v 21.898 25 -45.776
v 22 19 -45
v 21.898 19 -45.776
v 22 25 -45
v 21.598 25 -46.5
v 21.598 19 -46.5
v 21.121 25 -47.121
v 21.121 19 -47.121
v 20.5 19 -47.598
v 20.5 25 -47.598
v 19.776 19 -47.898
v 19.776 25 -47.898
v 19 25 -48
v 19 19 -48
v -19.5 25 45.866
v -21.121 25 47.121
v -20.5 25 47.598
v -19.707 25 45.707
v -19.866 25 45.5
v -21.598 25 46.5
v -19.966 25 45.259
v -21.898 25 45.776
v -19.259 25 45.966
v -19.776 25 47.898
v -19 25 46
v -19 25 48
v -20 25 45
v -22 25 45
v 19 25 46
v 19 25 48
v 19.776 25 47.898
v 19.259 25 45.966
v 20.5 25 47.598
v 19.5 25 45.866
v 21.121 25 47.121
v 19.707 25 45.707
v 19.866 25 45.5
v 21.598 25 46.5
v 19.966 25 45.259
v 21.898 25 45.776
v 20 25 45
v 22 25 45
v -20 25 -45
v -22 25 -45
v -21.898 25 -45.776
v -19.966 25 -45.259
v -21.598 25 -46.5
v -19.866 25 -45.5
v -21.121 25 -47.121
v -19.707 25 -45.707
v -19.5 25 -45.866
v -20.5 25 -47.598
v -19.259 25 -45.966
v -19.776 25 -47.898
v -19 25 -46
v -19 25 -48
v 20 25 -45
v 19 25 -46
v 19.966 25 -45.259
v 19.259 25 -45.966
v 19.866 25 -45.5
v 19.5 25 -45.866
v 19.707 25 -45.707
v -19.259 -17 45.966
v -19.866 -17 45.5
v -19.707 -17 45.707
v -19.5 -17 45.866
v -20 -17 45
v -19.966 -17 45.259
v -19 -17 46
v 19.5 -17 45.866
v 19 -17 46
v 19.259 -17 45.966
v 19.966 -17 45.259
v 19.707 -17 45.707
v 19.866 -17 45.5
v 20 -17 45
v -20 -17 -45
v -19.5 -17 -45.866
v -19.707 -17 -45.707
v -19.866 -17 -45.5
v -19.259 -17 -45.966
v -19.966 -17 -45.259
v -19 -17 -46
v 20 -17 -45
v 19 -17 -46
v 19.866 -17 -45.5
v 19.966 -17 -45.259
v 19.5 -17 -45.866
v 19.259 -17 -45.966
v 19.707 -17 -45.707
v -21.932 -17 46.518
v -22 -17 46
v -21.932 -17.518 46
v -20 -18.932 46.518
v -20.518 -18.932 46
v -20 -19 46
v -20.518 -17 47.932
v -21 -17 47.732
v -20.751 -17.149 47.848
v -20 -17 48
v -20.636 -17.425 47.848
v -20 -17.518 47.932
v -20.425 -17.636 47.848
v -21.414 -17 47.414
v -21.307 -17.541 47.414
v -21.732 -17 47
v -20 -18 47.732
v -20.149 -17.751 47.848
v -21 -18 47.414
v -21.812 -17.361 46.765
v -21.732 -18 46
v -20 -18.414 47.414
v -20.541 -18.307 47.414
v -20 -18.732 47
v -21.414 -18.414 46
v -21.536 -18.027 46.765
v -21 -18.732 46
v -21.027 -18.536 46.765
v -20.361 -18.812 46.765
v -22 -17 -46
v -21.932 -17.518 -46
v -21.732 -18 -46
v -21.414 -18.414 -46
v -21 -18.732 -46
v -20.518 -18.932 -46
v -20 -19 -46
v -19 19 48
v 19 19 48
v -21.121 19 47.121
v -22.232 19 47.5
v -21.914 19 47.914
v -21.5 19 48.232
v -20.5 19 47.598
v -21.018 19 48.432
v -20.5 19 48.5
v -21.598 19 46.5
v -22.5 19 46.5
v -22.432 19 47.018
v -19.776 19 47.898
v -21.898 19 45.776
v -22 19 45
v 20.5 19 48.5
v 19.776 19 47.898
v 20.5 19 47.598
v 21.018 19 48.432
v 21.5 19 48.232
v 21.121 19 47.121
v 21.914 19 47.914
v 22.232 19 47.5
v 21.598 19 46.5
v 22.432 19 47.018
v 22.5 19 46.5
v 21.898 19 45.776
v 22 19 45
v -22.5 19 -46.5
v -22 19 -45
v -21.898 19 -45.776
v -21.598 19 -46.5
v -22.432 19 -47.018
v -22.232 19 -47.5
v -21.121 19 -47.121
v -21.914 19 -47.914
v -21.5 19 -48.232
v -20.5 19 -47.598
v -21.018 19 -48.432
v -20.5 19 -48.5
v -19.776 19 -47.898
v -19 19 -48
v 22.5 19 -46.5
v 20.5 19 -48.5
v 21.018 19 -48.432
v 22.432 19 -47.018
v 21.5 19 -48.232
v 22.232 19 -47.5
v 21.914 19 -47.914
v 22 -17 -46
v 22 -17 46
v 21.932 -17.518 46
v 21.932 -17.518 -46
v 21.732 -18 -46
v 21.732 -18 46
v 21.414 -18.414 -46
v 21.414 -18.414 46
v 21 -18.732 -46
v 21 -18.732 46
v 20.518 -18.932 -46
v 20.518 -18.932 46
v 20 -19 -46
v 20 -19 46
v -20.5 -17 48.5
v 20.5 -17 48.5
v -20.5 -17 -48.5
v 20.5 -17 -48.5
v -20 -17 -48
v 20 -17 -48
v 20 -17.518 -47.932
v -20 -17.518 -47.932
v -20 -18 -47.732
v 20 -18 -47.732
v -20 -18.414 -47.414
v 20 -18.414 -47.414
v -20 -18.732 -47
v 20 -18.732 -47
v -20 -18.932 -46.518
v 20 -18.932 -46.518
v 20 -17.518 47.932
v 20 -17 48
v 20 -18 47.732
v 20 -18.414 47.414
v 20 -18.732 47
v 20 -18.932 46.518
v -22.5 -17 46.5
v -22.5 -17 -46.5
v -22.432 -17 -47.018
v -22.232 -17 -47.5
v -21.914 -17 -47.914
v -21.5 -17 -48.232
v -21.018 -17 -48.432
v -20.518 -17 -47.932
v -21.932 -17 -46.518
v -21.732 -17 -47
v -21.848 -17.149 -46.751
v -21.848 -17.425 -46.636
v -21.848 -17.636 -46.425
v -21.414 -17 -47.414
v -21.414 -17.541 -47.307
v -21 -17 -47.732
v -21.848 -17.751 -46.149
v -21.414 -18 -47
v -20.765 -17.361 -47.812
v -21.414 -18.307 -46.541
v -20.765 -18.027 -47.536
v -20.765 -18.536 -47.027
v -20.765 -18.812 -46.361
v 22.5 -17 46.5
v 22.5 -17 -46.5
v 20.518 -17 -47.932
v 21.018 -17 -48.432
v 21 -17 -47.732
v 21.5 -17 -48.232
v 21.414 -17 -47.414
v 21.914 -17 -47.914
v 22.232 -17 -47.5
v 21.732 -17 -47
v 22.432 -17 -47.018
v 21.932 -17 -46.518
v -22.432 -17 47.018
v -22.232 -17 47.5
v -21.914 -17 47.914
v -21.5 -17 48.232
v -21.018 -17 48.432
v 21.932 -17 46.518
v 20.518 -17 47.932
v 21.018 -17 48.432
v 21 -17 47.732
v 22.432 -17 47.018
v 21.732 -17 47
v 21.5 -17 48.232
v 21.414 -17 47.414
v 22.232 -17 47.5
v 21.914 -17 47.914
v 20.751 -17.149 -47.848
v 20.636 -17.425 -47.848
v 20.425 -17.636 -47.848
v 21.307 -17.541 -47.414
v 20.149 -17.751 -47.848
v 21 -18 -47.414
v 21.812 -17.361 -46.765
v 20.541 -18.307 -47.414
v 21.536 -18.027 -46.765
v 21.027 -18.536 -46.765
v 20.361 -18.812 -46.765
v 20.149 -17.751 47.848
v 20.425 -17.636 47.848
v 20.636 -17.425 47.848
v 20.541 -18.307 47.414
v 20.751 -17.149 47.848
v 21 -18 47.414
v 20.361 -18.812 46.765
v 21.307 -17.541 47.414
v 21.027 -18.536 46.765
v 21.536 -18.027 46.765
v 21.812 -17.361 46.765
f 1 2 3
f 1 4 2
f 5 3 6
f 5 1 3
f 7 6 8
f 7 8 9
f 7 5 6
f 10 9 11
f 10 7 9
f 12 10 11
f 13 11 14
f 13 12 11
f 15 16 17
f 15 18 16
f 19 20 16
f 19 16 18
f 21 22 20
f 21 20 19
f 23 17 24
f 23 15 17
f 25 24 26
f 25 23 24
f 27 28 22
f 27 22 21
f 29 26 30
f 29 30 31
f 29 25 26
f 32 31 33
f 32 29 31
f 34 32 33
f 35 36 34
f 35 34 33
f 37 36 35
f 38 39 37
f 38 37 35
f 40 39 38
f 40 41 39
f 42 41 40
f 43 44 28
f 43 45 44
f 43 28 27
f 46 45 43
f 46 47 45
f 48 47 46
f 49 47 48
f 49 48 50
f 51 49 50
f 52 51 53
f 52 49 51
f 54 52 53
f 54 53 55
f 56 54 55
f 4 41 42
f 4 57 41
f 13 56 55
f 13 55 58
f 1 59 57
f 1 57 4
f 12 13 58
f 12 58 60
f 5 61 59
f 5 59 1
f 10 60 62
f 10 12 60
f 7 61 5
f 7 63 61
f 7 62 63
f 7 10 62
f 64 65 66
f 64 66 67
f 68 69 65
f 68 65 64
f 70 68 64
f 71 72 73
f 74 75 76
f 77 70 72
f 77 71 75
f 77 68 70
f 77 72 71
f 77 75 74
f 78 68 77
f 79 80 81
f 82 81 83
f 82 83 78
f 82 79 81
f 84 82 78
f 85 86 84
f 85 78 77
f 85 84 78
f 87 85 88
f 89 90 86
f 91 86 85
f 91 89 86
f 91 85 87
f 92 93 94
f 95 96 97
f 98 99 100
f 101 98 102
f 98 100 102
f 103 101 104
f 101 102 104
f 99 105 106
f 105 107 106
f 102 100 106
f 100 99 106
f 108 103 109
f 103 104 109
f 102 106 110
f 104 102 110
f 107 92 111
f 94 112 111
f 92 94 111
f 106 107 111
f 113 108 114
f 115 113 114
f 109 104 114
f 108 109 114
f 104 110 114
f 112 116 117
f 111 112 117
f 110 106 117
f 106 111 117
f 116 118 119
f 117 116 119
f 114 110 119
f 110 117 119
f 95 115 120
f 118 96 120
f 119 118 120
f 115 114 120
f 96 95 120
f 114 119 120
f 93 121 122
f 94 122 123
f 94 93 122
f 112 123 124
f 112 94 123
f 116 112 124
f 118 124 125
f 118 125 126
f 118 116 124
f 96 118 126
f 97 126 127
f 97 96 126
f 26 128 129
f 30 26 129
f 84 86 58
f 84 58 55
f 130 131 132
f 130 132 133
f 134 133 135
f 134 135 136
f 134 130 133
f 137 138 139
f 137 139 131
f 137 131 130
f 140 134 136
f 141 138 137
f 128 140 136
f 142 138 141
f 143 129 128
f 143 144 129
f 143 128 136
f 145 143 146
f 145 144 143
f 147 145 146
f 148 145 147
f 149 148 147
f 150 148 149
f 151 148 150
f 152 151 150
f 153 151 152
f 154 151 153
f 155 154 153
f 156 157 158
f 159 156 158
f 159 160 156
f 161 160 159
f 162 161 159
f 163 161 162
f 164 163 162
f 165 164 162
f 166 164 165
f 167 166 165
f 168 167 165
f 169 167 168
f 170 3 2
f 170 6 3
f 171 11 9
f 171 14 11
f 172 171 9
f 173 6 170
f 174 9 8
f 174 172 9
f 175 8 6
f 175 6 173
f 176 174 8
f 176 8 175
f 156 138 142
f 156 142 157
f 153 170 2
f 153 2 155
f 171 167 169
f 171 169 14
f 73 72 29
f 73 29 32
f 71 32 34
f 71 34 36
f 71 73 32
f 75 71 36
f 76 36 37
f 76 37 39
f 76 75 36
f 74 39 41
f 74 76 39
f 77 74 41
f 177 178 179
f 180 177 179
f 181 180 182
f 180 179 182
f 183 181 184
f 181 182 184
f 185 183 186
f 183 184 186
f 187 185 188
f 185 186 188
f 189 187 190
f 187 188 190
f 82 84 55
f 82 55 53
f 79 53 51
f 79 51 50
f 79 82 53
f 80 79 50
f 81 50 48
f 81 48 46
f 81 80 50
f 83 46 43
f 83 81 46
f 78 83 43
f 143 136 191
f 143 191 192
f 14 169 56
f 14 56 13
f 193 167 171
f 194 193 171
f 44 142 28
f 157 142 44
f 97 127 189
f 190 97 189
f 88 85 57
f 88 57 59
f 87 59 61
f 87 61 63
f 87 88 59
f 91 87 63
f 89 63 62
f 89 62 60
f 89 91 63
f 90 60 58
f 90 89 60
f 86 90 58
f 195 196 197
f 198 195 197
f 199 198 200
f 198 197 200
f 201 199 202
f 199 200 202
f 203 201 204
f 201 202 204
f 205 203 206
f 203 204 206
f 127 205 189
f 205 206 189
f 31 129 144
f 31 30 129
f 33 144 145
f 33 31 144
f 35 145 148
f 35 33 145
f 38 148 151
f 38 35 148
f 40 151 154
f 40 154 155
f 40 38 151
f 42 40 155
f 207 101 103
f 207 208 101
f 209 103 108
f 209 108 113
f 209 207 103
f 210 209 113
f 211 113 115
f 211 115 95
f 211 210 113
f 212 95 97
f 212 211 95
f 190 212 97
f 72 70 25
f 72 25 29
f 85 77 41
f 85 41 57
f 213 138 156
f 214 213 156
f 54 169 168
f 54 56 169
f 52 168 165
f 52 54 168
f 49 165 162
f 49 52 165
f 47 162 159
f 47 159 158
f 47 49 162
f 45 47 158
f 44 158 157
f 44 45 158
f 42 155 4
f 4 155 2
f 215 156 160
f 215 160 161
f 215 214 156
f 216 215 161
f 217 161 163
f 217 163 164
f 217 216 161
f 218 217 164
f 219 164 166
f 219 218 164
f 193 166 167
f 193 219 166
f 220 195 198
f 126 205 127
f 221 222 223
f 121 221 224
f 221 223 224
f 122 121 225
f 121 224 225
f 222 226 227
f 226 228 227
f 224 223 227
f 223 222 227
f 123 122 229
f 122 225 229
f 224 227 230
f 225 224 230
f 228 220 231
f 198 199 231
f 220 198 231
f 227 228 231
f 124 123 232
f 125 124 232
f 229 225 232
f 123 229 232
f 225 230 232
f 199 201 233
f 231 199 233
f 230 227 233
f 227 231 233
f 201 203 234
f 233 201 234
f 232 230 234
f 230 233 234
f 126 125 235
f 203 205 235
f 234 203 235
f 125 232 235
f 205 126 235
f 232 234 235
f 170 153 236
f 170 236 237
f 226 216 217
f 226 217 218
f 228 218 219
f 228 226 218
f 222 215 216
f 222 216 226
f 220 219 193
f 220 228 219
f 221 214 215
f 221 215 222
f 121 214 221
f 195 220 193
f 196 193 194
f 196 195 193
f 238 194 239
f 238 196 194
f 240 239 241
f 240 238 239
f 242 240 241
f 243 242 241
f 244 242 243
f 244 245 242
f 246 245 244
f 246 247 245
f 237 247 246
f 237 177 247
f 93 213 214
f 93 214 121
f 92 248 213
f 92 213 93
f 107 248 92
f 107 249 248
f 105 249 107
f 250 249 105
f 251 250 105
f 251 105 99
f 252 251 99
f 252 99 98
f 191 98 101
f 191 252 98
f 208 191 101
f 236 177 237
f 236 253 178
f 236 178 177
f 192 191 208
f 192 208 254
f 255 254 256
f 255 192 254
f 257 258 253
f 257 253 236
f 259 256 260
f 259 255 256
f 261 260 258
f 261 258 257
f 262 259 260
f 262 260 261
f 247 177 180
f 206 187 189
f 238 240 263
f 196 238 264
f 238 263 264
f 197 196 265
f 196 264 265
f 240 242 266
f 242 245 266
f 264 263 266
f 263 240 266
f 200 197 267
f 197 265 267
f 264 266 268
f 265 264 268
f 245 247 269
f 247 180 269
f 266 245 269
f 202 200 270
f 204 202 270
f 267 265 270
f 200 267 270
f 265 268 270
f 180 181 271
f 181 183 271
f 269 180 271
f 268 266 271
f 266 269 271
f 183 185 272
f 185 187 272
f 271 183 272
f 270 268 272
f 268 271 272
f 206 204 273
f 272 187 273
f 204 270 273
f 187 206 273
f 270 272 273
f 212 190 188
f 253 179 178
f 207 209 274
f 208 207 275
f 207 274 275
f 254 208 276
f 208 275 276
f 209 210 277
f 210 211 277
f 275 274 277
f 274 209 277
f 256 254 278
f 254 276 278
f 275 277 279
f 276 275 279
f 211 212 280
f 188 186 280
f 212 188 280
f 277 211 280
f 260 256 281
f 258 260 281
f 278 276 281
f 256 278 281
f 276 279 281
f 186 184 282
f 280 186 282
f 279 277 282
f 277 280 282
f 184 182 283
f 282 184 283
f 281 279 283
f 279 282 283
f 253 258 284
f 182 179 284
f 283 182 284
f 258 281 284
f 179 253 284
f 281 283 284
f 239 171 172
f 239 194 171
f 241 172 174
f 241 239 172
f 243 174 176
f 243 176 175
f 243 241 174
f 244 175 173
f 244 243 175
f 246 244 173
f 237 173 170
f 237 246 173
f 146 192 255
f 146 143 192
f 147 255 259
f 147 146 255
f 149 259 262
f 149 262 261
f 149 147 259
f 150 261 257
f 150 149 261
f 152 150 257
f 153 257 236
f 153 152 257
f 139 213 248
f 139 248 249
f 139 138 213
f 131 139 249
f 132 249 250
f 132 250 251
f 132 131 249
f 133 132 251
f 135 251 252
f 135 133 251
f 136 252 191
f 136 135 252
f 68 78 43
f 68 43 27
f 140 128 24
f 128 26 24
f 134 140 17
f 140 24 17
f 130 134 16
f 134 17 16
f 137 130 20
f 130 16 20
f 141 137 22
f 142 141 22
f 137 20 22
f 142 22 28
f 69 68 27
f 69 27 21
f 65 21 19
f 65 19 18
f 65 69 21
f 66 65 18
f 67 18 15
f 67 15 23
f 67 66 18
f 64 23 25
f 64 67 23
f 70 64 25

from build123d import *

# Parameters (mm, degrees)
SKETCH1_W           = 45
SKETCH1_H           = 97
BOSS_EXTRUDE1_DEPTH = 19
SKETCH2_W           = 44
SKETCH2_H           = 96
BOSS_EXTRUDE2_DEPTH = 6
SKETCH3_W           = 45
SKETCH3_H           = 97
SKETCH3_W_2         = 44
SKETCH3_H_2         = 96
CUT_EXTRUDE1_DEPTH  = 2
FILLET1_R           = 2
FILLET4_R           = 3
FILLET5_R           = 2
SHELL2_START        = -17
SHELL2_DEPTH        = 42
SHELL2_2_OUTLINE_W  = 41
SHELL2_2_OUTLINE_H  = 93
SHELL2_2_DEPTH      = 34
BOSS_EXTRUDE3_START = 34
SKETCH4_W           = 41
SKETCH4_H           = 93
BOSS_EXTRUDE3_DEPTH = 34


# Read off the part's stored shape, not the designer's step: Shell2
with BuildPart() as part:
    # Sketch1 → Boss-Extrude1 (new, symmetric)
    with BuildSketch(Plane(origin=(0, 0, 0), x_dir=(1, 0, 0), z_dir=(0, 1, 0))):
        Rectangle(SKETCH1_W, SKETCH1_H)
    extrude(amount=BOSS_EXTRUDE1_DEPTH, both=True)

    # Sketch2 → Boss-Extrude2 (add)
    with BuildSketch(Plane(origin=(0, 19, 0), x_dir=(1, 0, 0), z_dir=(0, 1, 0))):
        Rectangle(SKETCH2_W, SKETCH2_H)
    extrude(amount=BOSS_EXTRUDE2_DEPTH)

    # Sketch3 → Cut-Extrude1 (cut)
    with BuildSketch(Plane.XZ.offset(19)):
        Rectangle(SKETCH3_W, SKETCH3_H)
        Rectangle(SKETCH3_W_2, SKETCH3_H_2, mode=Mode.SUBTRACT)
    extrude(amount=-CUT_EXTRUDE1_DEPTH, mode=Mode.SUBTRACT)

    # Fillet1
    fillet1_edges = [part.edges().sort_by_distance(p)[0] for p in [
        (22, -19, 0),
        (22, -18, -48),
        (0, -19, -48),
        (-22, -18, -48),
        (-22, -19, 0),
        (-22, -18, 48),
        (0, -19, 48),
        (22, -18, 48),
    ]]
    fillet(fillet1_edges, radius=FILLET1_R - 0.0001)  # a hair under: the kernel refuses the full size

    # Fillet4
    fillet4_edges = [part.edges().sort_by_distance(p)[0] for p in [
        (22, 22, 48),
        (22, 22, -48),
        (-22, 22, -48),
        (-22, 22, 48),
    ]]
    fillet(fillet4_edges, radius=FILLET4_R)

    # Fillet5
    fillet5_edges = [part.edges().sort_by_distance(p)[0] for p in [
        (22.5, 1, 48.5),
        (-22.5, 1, 48.5),
        (-22.5, 1, -48.5),
        (22.5, 1, -48.5),
    ]]
    fillet(fillet5_edges, radius=FILLET5_R)

    # Shell2 outline → Shell2 (cut)
    with BuildSketch(Plane(origin=(0, 0, 0), x_dir=(1, 0, 0), z_dir=(0, 1, 0)).offset(SHELL2_START)):
        with BuildLine():
            Line((20, -45), (20, 45))
            ThreePointArc((20, 45), (19.707106781, 45.707106781), (19, 46))
            Line((19, 46), (-19, 46))
            ThreePointArc((-19, 46), (-19.707106781, 45.707106781), (-20, 45))
            Line((-20, 45), (-20, -45))
            ThreePointArc((-20, -45), (-19.707106781, -45.707106781), (-19, -46))
            Line((-19, -46), (19, -46))
            ThreePointArc((19, -46), (19.707106781, -45.707106781), (20, -45))
        make_face()
    extrude(amount=SHELL2_DEPTH, mode=Mode.SUBTRACT)

    # Shell2 2 outline → Shell2 2 (cut)
    with BuildSketch(Plane(origin=(0, 0, 0), x_dir=(1, 0, 0), z_dir=(0, 1, 0)).offset(SHELL2_START)):
        Rectangle(SHELL2_2_OUTLINE_W, SHELL2_2_OUTLINE_H)
        with BuildLine():
            ThreePointArc((19, 46), (19.707106781, 45.707106781), (20, 45))
            Line((20, 45), (20, -45))
            ThreePointArc((20, -45), (19.707106781, -45.707106781), (19, -46))
            Line((19, -46), (-19, -46))
            ThreePointArc((-19, -46), (-19.707106781, -45.707106781), (-20, -45))
            Line((-20, -45), (-20, 45))
            ThreePointArc((-20, 45), (-19.707106781, 45.707106781), (-19, 46))
            Line((-19, 46), (19, 46))
        make_face(mode=Mode.SUBTRACT)
    extrude(amount=SHELL2_2_DEPTH, mode=Mode.SUBTRACT)

    # Sketch4 → Boss-Extrude3 (add)
    with BuildSketch(Plane.XZ.offset(-17).offset(BOSS_EXTRUDE3_START)):
        Rectangle(SKETCH4_W, SKETCH4_H)
        with BuildLine():
            Line((19, -46), (-19, -46))
            ThreePointArc((-19, -46), (-19.707106781, -45.707106781), (-20, -45))
            Line((-20, -45), (-20, 45))
            ThreePointArc((-20, 45), (-19.707106781, 45.707106781), (-19, 46))
            Line((-19, 46), (19, 46))
            ThreePointArc((19, 46), (19.707106781, 45.707106781), (20, 45))
            Line((20, 45), (20, -45))
            ThreePointArc((20, -45), (19.707106781, -45.707106781), (19, -46))
        make_face(mode=Mode.SUBTRACT)
    extrude(amount=-BOSS_EXTRUDE3_DEPTH)


solid = part.part
